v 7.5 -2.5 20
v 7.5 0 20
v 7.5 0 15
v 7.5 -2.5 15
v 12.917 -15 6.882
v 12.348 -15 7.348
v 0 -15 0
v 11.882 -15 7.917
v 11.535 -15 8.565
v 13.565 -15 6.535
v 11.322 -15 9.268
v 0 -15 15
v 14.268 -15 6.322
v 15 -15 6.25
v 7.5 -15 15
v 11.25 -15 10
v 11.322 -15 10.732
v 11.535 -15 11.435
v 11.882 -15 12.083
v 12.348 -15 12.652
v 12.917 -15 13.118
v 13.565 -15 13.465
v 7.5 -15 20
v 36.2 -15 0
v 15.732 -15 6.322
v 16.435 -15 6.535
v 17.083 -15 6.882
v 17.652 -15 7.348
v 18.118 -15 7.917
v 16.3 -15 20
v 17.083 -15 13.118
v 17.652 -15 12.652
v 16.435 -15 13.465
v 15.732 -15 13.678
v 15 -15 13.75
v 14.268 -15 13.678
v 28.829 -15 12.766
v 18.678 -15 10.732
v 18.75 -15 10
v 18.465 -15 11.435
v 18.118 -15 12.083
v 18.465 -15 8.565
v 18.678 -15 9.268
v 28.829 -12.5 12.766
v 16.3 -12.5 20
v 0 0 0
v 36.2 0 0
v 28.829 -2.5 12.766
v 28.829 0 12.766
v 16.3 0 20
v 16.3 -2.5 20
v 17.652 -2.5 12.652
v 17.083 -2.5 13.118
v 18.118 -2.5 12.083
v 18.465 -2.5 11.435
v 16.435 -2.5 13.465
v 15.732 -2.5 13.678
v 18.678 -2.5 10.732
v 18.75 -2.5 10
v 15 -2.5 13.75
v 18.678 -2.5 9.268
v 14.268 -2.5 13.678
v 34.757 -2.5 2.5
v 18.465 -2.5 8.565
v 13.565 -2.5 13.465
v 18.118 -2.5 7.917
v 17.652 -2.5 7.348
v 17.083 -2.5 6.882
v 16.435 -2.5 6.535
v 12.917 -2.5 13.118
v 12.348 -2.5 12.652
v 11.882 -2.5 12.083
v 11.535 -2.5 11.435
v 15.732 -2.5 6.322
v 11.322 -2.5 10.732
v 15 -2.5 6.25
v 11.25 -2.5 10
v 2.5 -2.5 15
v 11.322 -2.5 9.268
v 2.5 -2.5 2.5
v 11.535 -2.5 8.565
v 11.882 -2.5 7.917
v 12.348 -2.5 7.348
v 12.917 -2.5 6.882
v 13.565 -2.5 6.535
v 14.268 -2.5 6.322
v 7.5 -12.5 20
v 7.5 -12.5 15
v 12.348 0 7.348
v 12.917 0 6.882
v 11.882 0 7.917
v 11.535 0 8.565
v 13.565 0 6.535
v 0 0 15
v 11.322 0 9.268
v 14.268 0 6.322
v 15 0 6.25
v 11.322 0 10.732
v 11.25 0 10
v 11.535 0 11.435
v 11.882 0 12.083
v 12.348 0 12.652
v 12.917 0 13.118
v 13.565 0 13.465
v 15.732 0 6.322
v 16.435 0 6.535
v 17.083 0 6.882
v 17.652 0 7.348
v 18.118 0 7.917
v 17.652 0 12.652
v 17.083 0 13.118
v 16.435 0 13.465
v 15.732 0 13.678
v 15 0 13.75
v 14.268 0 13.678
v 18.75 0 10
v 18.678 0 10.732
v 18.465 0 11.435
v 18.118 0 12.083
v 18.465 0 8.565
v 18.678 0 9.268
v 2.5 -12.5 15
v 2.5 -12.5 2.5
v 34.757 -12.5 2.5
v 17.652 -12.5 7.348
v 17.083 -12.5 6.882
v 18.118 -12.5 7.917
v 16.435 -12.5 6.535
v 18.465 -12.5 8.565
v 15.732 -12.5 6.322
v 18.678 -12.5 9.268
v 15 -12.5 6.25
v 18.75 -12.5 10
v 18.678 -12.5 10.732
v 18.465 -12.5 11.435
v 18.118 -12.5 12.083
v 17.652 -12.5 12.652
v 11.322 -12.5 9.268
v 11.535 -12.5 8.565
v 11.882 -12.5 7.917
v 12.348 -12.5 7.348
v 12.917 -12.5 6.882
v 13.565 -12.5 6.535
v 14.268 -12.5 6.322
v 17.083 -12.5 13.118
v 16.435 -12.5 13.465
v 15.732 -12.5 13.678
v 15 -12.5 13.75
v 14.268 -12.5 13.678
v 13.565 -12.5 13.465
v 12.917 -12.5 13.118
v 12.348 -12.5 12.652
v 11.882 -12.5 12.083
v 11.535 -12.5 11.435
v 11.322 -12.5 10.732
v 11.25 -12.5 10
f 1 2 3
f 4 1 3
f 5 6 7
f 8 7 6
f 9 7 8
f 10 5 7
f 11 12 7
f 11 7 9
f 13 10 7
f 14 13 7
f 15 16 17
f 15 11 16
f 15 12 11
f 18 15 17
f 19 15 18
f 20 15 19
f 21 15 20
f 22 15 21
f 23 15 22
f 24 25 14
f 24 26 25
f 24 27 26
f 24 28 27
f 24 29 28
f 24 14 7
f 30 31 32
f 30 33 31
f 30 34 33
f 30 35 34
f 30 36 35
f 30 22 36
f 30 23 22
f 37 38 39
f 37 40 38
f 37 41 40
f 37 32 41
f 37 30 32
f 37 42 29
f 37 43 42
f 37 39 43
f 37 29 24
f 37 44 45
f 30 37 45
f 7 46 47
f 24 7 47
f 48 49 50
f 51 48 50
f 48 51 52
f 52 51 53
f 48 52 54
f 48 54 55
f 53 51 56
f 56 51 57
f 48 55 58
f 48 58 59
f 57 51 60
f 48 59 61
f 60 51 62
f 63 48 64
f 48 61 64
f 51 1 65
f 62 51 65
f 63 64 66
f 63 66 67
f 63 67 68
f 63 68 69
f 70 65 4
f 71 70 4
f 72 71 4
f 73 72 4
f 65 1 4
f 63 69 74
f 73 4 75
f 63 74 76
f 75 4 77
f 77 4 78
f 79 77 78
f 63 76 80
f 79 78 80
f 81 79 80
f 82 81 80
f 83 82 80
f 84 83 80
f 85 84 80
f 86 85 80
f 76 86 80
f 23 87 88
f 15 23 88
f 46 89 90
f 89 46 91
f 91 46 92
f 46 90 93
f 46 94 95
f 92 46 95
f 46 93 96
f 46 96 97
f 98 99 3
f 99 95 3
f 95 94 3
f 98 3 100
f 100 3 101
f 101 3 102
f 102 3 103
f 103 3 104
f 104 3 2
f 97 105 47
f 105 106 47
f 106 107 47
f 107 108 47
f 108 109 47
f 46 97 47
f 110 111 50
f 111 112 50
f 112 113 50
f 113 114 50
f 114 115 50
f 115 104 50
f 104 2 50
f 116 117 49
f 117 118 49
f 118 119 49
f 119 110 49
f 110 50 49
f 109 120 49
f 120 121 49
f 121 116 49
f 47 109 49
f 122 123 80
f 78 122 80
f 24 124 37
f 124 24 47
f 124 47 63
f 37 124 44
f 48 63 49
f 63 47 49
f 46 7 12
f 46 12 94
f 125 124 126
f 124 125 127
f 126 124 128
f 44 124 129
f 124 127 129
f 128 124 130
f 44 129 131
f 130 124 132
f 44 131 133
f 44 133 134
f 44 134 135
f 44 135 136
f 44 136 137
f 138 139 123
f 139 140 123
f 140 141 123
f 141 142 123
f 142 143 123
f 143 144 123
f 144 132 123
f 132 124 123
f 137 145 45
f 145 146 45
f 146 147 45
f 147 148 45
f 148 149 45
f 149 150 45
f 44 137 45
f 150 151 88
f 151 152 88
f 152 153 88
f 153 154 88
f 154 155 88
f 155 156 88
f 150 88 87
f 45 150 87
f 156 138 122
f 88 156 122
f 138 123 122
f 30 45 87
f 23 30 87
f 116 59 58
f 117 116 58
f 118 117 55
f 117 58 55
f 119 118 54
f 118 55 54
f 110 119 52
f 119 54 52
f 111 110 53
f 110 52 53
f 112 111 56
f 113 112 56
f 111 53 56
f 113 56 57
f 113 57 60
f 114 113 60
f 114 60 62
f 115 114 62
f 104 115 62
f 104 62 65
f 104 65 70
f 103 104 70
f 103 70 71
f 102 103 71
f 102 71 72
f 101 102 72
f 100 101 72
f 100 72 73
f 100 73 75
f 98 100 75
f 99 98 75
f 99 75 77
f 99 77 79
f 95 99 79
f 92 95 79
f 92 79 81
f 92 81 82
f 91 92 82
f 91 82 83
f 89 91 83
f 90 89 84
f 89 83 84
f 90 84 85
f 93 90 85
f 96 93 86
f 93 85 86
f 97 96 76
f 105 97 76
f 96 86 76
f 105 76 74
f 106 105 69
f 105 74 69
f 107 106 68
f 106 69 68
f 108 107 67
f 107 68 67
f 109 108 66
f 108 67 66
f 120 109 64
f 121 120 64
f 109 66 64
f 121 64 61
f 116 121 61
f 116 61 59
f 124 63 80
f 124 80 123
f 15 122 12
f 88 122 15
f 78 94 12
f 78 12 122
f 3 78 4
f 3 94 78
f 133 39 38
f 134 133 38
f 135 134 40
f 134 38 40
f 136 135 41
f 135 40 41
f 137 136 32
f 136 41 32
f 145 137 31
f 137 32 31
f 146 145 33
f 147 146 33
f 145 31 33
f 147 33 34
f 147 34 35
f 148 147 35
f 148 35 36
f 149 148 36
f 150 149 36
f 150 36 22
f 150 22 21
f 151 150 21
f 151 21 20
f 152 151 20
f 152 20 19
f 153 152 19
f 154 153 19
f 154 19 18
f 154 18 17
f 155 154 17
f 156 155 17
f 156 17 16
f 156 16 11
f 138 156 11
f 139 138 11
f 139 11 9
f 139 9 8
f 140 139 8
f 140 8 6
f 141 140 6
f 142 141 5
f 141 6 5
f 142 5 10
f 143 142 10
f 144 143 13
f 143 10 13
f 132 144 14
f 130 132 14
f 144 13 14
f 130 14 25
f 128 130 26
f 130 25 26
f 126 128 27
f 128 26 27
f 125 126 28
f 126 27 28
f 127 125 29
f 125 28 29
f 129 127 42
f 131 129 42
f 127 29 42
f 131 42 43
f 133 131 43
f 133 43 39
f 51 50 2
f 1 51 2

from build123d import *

# Parameters (mm, degrees)
F1_DEPTH = 15
F2_W     = 10
F2_H     = 7.5
F2_H_2   = 12.5
F3_DEPTH = 40
F4_R     = 3.75
F5_DEPTH = 29
F6_W     = 2.5
F6_H     = 10
F7_DEPTH = 12.5


with BuildPart() as f1:
    # F0 (on Front) → F1 (new body)
    with BuildSketch(Plane.XZ):
        Polygon((0, 15), (0, 0), (36.2, 0), (28.829492, 12.766094), (16.3, 20), (7.5, 20), (7.5, 15), align=None)
    extrude(amount=F1_DEPTH)

    # F2 (on face) → F3 (cut)
    with BuildSketch(Plane(origin=(0, 0, 0), x_dir=(0, -1, 0), z_dir=(-1, 0, 0))):
        with Locations((7.5, 18.75)):
            Rectangle(F2_W, F2_H)
        with Locations((7.5, 8.75)):
            Rectangle(F2_W, F2_H_2)
    extrude(amount=-F3_DEPTH, mode=Mode.SUBTRACT)

    # F4 (on face) → F5 (cut)
    with BuildSketch(Plane.XZ.offset(15)):
        with Locations((15, 10)):
            Circle(F4_R)
    extrude(amount=-F5_DEPTH, mode=Mode.SUBTRACT)

    # F6 (on face) → F7 (join)
    with BuildSketch(Plane.XY.offset(2.5)):
        with Locations((1.25, -7.5)):
            Rectangle(F6_W, F6_H)
    extrude(amount=F7_DEPTH)


solid = f1.part
